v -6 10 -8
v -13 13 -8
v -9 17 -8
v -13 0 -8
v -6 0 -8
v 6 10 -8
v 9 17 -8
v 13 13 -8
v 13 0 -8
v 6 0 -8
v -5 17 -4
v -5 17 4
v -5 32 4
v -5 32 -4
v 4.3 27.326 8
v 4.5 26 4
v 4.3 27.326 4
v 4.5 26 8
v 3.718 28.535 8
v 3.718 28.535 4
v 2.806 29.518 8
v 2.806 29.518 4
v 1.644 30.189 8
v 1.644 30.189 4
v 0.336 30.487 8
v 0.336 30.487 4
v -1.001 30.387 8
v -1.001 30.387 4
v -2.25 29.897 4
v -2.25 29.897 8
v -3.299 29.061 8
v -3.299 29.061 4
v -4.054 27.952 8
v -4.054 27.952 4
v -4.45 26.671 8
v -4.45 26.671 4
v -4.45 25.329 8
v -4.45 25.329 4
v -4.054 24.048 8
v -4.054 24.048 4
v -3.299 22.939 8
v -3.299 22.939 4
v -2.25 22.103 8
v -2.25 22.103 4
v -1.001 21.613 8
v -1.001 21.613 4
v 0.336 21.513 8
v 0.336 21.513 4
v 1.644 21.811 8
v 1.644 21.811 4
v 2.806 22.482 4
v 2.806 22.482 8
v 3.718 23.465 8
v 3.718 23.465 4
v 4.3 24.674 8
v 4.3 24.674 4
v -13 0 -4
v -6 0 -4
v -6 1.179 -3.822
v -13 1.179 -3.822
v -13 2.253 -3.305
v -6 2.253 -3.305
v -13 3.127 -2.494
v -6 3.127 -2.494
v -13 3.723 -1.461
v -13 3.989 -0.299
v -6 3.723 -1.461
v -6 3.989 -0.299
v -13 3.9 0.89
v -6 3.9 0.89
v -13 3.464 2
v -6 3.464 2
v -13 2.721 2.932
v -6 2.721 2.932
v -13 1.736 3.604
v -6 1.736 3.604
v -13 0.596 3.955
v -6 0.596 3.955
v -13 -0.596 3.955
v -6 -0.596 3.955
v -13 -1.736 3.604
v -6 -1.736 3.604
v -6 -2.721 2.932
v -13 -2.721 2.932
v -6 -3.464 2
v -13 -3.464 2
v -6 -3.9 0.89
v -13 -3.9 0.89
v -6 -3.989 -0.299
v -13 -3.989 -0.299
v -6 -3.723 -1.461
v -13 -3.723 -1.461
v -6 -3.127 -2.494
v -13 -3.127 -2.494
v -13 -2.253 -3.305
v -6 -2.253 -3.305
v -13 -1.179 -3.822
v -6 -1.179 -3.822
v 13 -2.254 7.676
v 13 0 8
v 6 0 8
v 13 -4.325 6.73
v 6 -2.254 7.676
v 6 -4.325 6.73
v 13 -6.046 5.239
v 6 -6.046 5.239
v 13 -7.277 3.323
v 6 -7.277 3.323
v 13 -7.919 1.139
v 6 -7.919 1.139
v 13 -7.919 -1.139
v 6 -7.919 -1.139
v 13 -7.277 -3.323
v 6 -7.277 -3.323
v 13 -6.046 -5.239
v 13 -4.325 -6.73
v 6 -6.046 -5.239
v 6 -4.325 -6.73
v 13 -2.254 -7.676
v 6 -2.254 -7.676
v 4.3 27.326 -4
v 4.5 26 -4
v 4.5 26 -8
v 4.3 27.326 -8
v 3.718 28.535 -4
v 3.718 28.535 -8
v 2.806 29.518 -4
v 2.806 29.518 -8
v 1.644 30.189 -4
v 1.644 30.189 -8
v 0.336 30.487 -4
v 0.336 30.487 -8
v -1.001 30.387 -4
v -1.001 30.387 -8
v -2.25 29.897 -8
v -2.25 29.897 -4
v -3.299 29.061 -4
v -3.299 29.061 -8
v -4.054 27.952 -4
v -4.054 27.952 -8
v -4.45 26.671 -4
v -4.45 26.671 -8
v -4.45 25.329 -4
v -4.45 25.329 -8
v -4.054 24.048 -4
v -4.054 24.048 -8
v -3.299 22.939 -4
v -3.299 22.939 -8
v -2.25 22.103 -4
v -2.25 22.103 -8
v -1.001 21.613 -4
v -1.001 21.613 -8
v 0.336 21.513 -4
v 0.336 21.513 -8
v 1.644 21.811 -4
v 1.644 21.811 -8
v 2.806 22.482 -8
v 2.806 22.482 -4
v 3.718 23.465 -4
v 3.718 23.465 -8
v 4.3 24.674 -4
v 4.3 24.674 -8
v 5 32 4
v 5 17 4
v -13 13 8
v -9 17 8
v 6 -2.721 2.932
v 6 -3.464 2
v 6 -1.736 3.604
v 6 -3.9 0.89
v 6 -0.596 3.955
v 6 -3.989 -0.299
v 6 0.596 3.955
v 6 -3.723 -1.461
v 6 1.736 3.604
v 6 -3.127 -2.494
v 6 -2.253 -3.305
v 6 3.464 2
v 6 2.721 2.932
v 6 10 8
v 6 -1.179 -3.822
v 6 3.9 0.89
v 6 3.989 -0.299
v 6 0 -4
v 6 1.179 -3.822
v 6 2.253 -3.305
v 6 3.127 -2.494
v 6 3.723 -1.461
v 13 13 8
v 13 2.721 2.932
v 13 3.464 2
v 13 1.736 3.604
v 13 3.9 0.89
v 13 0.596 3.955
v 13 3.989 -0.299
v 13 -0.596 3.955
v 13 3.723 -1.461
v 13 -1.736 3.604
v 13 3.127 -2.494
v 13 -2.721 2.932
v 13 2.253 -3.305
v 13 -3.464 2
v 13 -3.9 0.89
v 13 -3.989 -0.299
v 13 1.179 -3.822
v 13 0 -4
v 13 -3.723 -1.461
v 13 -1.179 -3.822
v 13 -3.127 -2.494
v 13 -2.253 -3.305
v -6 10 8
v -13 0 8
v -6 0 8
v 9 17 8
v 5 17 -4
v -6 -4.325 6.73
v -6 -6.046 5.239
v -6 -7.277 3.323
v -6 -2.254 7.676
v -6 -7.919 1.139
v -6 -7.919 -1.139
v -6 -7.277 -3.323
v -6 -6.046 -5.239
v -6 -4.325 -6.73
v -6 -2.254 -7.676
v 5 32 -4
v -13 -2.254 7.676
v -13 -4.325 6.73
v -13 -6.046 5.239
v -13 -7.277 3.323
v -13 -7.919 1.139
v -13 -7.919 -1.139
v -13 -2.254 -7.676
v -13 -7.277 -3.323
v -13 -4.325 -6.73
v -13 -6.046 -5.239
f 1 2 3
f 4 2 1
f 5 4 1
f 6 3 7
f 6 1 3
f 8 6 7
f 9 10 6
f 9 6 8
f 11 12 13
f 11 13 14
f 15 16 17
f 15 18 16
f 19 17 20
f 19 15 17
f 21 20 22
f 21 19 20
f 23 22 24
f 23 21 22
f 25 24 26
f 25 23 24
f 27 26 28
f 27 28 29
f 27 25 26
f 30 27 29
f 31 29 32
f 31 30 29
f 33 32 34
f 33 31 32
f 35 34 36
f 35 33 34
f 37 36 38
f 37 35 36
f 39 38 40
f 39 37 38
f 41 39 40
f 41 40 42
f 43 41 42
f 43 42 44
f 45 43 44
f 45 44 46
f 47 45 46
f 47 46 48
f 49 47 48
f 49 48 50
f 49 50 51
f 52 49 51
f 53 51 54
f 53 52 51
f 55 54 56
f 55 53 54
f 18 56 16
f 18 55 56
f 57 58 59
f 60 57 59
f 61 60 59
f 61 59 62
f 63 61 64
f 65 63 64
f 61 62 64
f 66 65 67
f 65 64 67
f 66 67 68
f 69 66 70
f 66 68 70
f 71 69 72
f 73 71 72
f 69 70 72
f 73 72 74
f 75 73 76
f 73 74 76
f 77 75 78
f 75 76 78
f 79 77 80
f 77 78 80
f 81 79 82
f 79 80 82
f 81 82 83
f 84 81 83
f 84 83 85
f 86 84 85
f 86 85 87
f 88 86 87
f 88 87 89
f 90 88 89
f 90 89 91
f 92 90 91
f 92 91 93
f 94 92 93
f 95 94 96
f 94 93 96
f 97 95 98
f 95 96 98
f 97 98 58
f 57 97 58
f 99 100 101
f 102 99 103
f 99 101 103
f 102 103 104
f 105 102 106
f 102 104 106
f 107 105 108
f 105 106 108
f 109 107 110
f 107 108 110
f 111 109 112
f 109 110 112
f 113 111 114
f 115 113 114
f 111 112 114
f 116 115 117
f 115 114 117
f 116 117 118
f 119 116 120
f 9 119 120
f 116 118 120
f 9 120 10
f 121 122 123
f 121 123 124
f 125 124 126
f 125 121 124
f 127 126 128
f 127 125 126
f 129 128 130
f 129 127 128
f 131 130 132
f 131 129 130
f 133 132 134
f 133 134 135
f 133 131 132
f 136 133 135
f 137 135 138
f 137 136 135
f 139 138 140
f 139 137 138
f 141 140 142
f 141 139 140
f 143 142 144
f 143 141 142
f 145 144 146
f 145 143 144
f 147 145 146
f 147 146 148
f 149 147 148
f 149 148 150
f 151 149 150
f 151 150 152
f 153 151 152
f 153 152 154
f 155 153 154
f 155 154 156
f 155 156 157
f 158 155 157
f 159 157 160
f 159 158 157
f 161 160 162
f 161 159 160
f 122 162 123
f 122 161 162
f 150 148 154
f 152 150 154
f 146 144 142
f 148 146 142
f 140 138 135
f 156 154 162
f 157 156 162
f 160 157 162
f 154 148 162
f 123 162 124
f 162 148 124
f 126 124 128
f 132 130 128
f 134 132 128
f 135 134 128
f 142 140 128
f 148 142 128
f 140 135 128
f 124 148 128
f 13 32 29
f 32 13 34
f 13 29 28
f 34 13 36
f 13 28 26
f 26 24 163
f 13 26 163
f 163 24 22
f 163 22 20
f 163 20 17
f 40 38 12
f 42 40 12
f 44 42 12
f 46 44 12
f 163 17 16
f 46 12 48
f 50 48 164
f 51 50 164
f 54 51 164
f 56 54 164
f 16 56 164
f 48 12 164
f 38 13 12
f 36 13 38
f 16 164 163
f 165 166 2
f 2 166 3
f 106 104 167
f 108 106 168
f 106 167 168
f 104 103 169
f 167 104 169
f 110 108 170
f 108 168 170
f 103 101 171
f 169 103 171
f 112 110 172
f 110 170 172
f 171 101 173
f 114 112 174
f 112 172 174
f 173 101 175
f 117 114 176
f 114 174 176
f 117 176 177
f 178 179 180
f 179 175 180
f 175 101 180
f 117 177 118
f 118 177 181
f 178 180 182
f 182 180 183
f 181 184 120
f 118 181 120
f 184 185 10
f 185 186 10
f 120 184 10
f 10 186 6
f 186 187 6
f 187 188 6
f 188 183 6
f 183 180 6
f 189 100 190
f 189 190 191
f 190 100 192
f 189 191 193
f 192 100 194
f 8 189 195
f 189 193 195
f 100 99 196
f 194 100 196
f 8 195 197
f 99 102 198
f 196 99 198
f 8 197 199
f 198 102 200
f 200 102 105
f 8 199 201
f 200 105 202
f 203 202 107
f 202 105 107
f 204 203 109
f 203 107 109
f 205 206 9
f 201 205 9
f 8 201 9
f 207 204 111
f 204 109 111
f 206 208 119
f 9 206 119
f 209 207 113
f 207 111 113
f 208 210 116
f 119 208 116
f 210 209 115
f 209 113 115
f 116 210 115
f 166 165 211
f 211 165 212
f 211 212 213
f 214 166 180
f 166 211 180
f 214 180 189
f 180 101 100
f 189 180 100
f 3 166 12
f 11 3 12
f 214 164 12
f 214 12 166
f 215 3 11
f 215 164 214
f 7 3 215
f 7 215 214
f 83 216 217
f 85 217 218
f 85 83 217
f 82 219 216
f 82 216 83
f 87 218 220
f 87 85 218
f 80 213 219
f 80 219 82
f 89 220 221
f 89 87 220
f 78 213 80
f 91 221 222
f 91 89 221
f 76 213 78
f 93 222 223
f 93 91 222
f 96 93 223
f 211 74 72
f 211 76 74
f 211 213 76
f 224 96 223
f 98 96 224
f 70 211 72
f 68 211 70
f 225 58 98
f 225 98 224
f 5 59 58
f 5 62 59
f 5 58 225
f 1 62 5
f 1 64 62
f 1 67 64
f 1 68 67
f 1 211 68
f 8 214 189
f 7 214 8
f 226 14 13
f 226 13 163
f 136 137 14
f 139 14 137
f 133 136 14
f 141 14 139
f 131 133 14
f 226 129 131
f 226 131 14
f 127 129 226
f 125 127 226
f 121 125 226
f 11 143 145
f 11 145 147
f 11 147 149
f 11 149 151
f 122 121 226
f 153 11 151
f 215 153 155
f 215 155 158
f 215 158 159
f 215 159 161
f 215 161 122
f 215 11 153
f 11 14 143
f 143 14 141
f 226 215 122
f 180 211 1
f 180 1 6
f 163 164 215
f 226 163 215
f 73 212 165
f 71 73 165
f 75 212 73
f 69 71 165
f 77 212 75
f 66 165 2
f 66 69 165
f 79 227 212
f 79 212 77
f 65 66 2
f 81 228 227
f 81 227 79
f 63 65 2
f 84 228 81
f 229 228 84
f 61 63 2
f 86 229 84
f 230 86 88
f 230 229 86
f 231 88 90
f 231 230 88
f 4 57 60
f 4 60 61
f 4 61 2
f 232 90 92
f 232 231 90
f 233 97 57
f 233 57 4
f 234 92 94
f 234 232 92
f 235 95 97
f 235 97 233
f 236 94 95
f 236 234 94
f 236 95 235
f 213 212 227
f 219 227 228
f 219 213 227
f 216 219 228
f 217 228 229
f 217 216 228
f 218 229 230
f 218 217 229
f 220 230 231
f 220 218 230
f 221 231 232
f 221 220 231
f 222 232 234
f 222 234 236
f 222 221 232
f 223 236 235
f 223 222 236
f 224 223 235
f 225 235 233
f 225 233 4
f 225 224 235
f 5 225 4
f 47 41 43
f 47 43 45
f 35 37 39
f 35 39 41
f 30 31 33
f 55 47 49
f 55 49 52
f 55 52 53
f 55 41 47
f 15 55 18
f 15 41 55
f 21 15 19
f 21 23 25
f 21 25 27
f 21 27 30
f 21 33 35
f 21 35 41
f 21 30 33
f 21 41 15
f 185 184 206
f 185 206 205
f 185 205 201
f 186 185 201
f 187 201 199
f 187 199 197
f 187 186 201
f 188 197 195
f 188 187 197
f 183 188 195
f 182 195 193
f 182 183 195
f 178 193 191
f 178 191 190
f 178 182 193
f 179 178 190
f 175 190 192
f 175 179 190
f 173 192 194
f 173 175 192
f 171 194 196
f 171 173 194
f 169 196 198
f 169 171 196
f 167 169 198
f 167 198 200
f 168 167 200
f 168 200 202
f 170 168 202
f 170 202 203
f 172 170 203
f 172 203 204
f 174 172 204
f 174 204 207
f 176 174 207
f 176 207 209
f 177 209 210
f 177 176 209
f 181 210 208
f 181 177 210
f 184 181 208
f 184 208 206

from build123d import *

# Parameters (mm, degrees)
BOSS_EXTRUDE1_START = 6
SKETCH1_R           = 4
BOSS_EXTRUDE1_DEPTH = 7
BOSS_EXTRUDE2_START = -6
SKETCH1_2_R         = 4
BOSS_EXTRUDE2_DEPTH = 7
SKETCH2_W           = 26
SKETCH2_H           = 16
BOSS_EXTRUDE3_DEPTH = 7
CHAMFER1_SIZE       = 4
SKETCH3_W           = 10
SKETCH3_H           = 8
BOSS_EXTRUDE4_DEPTH = 15
SKETCH5_R           = 4.5
BOSS_EXTRUDE5_DEPTH = 8


with BuildPart() as part:
    # Sketch1 → Boss-Extrude1 (new body)
    with BuildSketch(Plane(origin=(0, 0, 0), x_dir=(0, 0, -1), z_dir=(1, 0, 0)).offset(BOSS_EXTRUDE1_START)):
        with BuildLine():
            Line((8, 10), (-8, 10))
            Line((-8, 10), (-8, 0))
            ThreePointArc((-8, 0), (0, -8), (8, 0))
            Line((8, 0), (8, 10))
        make_face()
        Circle(SKETCH1_R, mode=Mode.SUBTRACT)
    extrude(amount=BOSS_EXTRUDE1_DEPTH)



with BuildPart() as body_2:
    # Sketch1<2> → Boss-Extrude2 (new body)
    with BuildSketch(Plane(origin=(0, 0, 0), x_dir=(0, 0, -1), z_dir=(1, 0, 0)).offset(BOSS_EXTRUDE2_START)):
        with BuildLine():
            Line((8, 10), (-8, 10))
            Line((-8, 10), (-8, 0))
            ThreePointArc((-8, 0), (0, -8), (8, 0))
            Line((8, 0), (8, 10))
        make_face()
        Circle(SKETCH1_2_R, mode=Mode.SUBTRACT)
    extrude(amount=-BOSS_EXTRUDE2_DEPTH)


with BuildPart() as part_1:
    add(part.part)

    add(body_2.part)  # Boss-Extrude3 merges body 2
    # Sketch2 → Boss-Extrude3 (add)
    with BuildSketch(Plane(origin=(0, 10, 0), x_dir=(1, 0, 0), z_dir=(0, 1, 0))):
        Rectangle(SKETCH2_W, SKETCH2_H)
    extrude(amount=BOSS_EXTRUDE3_DEPTH)

    # Chamfer1
    chamfer1_edges = [part_1.edges().sort_by_distance(p)[0] for p in [
        (-13, 17, 0),
        (13, 17, 0),
    ]]
    chamfer(chamfer1_edges, length=CHAMFER1_SIZE)

    # Sketch3 → Boss-Extrude4 (add)
    with BuildSketch(Plane(origin=(0, 17, 0), x_dir=(1, 0, 0), z_dir=(0, 1, 0))):
        Rectangle(SKETCH3_W, SKETCH3_H)
    extrude(amount=BOSS_EXTRUDE4_DEPTH)

    # Sketch5 → Boss-Extrude5 (add, symmetric)
    with BuildSketch(Plane.XY):
        with Locations((0, 26)):
            Circle(SKETCH5_R)
    extrude(amount=BOSS_EXTRUDE5_DEPTH, both=True)


solid = part_1.part
